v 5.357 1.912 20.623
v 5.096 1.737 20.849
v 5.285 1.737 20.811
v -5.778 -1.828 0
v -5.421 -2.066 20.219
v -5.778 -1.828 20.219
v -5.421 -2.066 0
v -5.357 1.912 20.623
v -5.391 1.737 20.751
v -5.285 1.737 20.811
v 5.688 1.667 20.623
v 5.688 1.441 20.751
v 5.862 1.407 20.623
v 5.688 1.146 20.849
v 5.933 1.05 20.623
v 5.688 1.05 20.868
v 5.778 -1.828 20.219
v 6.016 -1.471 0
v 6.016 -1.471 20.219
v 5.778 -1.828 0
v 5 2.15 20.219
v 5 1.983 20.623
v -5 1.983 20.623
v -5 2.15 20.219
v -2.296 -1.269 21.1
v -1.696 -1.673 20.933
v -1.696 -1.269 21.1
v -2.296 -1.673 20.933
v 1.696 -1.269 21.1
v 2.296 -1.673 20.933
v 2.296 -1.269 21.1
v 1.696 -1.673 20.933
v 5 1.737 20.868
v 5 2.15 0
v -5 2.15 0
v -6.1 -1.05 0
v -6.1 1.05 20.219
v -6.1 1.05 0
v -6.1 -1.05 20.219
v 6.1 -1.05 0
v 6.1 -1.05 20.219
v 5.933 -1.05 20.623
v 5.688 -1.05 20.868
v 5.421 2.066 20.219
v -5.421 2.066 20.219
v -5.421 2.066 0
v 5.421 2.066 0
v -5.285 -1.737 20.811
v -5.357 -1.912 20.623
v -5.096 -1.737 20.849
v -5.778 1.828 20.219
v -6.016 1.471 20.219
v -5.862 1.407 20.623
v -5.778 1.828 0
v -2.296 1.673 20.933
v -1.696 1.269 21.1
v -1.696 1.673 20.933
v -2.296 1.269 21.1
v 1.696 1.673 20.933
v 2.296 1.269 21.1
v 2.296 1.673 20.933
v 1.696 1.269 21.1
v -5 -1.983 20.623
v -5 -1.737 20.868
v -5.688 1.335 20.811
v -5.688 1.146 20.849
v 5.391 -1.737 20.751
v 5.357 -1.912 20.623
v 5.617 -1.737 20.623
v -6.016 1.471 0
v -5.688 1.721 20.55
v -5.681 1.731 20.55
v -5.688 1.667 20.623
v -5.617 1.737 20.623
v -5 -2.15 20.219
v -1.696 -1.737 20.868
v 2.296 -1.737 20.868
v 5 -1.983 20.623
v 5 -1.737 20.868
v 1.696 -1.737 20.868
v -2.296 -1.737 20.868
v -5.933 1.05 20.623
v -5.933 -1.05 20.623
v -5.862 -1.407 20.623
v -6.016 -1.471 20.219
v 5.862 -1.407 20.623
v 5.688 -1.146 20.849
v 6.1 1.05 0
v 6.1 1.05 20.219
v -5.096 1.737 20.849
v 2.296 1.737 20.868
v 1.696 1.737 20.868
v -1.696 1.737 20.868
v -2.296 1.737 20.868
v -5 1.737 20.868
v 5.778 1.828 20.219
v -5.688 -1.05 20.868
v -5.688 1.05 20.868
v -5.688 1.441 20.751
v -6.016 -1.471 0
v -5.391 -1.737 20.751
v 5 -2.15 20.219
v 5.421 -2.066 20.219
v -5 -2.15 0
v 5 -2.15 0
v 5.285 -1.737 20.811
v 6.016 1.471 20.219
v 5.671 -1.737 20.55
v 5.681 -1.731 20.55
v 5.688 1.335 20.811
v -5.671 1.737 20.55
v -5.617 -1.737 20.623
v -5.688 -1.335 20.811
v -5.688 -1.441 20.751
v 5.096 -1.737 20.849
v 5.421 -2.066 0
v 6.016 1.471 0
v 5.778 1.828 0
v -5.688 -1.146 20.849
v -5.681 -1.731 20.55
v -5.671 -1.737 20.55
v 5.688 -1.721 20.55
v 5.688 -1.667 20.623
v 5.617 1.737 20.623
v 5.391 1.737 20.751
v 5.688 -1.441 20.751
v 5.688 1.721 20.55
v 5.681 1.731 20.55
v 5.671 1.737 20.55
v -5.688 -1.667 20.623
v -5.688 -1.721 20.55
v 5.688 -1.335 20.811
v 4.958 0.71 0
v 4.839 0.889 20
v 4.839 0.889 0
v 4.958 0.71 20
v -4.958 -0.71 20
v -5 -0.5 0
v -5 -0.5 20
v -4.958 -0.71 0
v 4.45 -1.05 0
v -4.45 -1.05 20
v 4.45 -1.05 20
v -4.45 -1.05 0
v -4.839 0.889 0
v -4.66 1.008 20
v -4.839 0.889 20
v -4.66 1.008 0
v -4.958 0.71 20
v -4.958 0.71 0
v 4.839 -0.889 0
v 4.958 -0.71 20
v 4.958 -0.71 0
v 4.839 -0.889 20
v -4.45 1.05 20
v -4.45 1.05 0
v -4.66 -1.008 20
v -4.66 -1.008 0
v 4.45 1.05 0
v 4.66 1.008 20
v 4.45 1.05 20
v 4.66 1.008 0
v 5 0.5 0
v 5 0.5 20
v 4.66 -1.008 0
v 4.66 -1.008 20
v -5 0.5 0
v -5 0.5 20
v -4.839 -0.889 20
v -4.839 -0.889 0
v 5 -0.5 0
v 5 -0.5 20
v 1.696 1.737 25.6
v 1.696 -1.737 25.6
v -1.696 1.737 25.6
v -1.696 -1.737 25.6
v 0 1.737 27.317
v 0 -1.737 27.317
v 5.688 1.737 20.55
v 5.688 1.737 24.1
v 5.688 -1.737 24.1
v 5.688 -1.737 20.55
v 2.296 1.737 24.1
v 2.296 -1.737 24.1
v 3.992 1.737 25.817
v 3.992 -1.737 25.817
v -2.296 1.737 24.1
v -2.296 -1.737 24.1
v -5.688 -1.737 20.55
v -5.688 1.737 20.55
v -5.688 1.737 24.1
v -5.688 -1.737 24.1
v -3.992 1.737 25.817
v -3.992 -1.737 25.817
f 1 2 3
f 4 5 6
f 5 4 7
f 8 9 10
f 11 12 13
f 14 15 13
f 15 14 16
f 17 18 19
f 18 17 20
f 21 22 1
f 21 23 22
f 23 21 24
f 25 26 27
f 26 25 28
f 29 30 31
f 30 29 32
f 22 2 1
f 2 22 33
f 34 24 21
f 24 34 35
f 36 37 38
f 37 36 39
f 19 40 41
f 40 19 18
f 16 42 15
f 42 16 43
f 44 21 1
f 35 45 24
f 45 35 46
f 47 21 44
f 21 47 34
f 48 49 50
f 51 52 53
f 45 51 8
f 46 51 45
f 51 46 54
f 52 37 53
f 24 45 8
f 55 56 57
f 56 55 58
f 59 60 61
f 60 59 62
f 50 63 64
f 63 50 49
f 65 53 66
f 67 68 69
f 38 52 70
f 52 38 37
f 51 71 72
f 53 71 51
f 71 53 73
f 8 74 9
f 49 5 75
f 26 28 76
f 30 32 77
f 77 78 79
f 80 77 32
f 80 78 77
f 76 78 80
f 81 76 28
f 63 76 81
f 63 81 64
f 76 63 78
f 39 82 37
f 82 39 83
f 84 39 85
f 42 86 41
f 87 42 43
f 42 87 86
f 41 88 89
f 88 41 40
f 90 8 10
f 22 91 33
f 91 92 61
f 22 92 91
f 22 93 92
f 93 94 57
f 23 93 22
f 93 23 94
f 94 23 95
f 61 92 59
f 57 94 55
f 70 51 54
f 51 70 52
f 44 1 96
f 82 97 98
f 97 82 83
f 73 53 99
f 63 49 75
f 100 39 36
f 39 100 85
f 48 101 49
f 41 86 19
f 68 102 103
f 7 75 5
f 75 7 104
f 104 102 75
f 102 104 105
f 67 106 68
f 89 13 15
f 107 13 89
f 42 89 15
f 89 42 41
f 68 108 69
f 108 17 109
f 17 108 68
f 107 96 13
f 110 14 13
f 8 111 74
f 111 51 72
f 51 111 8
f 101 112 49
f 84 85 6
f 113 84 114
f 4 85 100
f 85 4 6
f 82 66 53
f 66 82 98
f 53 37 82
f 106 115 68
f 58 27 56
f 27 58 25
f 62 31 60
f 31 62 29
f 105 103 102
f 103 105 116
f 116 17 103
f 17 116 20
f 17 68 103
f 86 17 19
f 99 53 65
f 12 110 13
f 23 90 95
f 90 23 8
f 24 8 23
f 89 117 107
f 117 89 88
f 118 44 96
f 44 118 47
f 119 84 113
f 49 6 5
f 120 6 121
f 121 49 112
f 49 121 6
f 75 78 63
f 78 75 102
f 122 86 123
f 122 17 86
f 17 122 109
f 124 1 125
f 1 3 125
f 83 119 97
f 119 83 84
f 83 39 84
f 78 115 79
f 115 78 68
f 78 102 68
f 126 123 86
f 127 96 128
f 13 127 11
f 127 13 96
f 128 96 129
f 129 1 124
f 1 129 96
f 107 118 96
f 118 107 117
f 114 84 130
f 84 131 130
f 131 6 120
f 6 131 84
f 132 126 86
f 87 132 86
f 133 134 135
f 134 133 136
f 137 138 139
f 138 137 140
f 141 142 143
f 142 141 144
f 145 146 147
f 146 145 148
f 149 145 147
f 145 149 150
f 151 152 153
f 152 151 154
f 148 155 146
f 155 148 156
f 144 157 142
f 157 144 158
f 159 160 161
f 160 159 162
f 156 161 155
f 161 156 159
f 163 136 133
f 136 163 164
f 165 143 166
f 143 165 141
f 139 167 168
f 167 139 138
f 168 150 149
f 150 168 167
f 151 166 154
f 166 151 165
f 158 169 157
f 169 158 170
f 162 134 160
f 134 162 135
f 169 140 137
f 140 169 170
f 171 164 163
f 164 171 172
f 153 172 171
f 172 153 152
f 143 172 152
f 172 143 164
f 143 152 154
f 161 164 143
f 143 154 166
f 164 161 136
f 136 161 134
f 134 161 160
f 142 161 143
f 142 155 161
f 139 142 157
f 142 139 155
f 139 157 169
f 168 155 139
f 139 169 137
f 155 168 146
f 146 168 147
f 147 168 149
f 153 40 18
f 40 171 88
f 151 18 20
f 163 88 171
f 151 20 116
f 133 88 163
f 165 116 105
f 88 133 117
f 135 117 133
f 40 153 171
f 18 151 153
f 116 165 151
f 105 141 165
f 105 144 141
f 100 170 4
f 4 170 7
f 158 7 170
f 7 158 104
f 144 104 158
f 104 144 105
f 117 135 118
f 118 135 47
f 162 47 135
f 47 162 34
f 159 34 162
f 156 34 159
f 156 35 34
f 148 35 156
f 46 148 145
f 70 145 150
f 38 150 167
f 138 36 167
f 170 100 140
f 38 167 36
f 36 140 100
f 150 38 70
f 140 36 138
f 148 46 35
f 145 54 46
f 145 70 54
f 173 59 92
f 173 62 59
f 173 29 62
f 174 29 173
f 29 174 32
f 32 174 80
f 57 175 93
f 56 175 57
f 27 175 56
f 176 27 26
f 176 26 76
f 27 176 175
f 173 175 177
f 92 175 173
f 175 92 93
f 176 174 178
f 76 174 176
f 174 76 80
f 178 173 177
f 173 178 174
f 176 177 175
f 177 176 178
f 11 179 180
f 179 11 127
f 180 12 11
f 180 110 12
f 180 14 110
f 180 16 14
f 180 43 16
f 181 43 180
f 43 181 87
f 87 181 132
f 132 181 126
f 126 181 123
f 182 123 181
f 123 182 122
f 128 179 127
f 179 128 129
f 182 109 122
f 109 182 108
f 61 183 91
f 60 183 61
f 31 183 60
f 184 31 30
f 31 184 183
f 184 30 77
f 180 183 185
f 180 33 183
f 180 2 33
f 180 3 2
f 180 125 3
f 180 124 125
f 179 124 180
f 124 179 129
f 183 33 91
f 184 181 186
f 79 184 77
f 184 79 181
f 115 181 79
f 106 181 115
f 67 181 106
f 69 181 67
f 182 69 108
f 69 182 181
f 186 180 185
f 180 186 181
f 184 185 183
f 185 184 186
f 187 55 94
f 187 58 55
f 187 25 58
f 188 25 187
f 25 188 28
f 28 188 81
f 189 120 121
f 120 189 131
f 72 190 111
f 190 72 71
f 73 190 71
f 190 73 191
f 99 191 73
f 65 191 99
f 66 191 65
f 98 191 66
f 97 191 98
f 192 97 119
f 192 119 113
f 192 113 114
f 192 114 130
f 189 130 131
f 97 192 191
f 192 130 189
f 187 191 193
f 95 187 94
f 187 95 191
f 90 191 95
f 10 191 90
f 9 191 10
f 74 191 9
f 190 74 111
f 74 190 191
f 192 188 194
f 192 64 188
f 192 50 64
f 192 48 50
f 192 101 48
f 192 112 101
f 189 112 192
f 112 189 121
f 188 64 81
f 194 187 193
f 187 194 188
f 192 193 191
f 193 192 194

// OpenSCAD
/* Tea Helper, a minimalist tool to mount upon your tea spoon so you can use it
 * to lift up the tea bag wire, preventing it from draining your cup through
 * capillary action.
 * By DrLex, 2018/01
 * Released under Creative Commons - Attribution license */

// How much of the spoon handle will be covered
height = 20;

// Width of the spoon handle at the widest point that is covered
width = 10;

// Maximum thickness of the spoon handle
thickness = 2.1;

// Gap for the wire, make this wide enough for the wire to pass through, but narrow enough to clamp it
gap = 0.6;

// Wall thickness
walls = 1.1;


/* [Hidden] */
w2 = width + 2 * walls;
t2 = thickness + 2 * walls;
h2 = height + walls;
halfwall = walls/2;

stubWidth = 2 * ((width + 1.25 * walls)/2 - gap)/3;
stubDepth = thickness + 1.25 * walls;

innerRadius = thickness > walls ? halfwall : thickness * .99 / 2;
innerDia = 2 * innerRadius;

// Due to the way in which OpenSCAD renders spheres, a sphere of given radius and resolution will be
// smaller than a perfect sphere by a factor cos(180/resolution), similar to how circles are approximated.
sphere16_correction = 1/cos(180/16);

difference() {
    minkowski() {
        cube([width, thickness, height*2], center=true);
        scale(sphere16_correction) sphere(walls, $fn=16);
    }

    minkowski() {
        cube([width - innerDia, thickness - innerDia, height*2], center=true);
        // By using a cylinder and resolution such that it has vertices on its X and Y axes, no correction is needed.
        translate([0, 0, -1]) cylinder(r=innerRadius, h=1, $fn=16);
    }

    translate([0,0,-h2]) cube([w2*2, t2*2, h2*2], center=true);
}

translate([0,0,h2-halfwall]) {
    prismHeight = (stubWidth + stubDepth)/2;
    scale([stubWidth, stubDepth, 4.5+halfwall]) translate([0, 0, .5]) cube(center=true);
    translate([0, 0, 4.5+halfwall]) scale([stubWidth, stubDepth, prismHeight]) prism();
    translate([stubWidth + gap, 0, 0]) scale([stubWidth, stubDepth, 3+halfwall]) translate([0, 0, .5]) cube(center=true);
    translate([stubWidth + gap, 0, 3+halfwall]) scale([stubWidth, stubDepth, prismHeight]) prism();
    translate([-stubWidth - gap, 0, 0]) scale([stubWidth, stubDepth, 3+halfwall]) translate([0, 0, .5]) cube(center=true);
    translate([-stubWidth - gap, 0, 3+halfwall]) scale([stubWidth, stubDepth, prismHeight]) prism();

//    octaBox(stubWidth, stubDepth, 5+halfwall);
//    translate([stubWidth + gap, 0, 0]) octaBox(stubWidth, stubDepth, 3+halfwall);
//    translate([-stubWidth - gap, 0, 0]) octaBox(stubWidth, stubDepth, 3+halfwall);
}

module prism()
{
    rotate([90, 0, 0]) translate([0, 0, -.5]) linear_extrude(1) polygon([[-.5, 0], [.5, 0], [0, .5]]);
}
